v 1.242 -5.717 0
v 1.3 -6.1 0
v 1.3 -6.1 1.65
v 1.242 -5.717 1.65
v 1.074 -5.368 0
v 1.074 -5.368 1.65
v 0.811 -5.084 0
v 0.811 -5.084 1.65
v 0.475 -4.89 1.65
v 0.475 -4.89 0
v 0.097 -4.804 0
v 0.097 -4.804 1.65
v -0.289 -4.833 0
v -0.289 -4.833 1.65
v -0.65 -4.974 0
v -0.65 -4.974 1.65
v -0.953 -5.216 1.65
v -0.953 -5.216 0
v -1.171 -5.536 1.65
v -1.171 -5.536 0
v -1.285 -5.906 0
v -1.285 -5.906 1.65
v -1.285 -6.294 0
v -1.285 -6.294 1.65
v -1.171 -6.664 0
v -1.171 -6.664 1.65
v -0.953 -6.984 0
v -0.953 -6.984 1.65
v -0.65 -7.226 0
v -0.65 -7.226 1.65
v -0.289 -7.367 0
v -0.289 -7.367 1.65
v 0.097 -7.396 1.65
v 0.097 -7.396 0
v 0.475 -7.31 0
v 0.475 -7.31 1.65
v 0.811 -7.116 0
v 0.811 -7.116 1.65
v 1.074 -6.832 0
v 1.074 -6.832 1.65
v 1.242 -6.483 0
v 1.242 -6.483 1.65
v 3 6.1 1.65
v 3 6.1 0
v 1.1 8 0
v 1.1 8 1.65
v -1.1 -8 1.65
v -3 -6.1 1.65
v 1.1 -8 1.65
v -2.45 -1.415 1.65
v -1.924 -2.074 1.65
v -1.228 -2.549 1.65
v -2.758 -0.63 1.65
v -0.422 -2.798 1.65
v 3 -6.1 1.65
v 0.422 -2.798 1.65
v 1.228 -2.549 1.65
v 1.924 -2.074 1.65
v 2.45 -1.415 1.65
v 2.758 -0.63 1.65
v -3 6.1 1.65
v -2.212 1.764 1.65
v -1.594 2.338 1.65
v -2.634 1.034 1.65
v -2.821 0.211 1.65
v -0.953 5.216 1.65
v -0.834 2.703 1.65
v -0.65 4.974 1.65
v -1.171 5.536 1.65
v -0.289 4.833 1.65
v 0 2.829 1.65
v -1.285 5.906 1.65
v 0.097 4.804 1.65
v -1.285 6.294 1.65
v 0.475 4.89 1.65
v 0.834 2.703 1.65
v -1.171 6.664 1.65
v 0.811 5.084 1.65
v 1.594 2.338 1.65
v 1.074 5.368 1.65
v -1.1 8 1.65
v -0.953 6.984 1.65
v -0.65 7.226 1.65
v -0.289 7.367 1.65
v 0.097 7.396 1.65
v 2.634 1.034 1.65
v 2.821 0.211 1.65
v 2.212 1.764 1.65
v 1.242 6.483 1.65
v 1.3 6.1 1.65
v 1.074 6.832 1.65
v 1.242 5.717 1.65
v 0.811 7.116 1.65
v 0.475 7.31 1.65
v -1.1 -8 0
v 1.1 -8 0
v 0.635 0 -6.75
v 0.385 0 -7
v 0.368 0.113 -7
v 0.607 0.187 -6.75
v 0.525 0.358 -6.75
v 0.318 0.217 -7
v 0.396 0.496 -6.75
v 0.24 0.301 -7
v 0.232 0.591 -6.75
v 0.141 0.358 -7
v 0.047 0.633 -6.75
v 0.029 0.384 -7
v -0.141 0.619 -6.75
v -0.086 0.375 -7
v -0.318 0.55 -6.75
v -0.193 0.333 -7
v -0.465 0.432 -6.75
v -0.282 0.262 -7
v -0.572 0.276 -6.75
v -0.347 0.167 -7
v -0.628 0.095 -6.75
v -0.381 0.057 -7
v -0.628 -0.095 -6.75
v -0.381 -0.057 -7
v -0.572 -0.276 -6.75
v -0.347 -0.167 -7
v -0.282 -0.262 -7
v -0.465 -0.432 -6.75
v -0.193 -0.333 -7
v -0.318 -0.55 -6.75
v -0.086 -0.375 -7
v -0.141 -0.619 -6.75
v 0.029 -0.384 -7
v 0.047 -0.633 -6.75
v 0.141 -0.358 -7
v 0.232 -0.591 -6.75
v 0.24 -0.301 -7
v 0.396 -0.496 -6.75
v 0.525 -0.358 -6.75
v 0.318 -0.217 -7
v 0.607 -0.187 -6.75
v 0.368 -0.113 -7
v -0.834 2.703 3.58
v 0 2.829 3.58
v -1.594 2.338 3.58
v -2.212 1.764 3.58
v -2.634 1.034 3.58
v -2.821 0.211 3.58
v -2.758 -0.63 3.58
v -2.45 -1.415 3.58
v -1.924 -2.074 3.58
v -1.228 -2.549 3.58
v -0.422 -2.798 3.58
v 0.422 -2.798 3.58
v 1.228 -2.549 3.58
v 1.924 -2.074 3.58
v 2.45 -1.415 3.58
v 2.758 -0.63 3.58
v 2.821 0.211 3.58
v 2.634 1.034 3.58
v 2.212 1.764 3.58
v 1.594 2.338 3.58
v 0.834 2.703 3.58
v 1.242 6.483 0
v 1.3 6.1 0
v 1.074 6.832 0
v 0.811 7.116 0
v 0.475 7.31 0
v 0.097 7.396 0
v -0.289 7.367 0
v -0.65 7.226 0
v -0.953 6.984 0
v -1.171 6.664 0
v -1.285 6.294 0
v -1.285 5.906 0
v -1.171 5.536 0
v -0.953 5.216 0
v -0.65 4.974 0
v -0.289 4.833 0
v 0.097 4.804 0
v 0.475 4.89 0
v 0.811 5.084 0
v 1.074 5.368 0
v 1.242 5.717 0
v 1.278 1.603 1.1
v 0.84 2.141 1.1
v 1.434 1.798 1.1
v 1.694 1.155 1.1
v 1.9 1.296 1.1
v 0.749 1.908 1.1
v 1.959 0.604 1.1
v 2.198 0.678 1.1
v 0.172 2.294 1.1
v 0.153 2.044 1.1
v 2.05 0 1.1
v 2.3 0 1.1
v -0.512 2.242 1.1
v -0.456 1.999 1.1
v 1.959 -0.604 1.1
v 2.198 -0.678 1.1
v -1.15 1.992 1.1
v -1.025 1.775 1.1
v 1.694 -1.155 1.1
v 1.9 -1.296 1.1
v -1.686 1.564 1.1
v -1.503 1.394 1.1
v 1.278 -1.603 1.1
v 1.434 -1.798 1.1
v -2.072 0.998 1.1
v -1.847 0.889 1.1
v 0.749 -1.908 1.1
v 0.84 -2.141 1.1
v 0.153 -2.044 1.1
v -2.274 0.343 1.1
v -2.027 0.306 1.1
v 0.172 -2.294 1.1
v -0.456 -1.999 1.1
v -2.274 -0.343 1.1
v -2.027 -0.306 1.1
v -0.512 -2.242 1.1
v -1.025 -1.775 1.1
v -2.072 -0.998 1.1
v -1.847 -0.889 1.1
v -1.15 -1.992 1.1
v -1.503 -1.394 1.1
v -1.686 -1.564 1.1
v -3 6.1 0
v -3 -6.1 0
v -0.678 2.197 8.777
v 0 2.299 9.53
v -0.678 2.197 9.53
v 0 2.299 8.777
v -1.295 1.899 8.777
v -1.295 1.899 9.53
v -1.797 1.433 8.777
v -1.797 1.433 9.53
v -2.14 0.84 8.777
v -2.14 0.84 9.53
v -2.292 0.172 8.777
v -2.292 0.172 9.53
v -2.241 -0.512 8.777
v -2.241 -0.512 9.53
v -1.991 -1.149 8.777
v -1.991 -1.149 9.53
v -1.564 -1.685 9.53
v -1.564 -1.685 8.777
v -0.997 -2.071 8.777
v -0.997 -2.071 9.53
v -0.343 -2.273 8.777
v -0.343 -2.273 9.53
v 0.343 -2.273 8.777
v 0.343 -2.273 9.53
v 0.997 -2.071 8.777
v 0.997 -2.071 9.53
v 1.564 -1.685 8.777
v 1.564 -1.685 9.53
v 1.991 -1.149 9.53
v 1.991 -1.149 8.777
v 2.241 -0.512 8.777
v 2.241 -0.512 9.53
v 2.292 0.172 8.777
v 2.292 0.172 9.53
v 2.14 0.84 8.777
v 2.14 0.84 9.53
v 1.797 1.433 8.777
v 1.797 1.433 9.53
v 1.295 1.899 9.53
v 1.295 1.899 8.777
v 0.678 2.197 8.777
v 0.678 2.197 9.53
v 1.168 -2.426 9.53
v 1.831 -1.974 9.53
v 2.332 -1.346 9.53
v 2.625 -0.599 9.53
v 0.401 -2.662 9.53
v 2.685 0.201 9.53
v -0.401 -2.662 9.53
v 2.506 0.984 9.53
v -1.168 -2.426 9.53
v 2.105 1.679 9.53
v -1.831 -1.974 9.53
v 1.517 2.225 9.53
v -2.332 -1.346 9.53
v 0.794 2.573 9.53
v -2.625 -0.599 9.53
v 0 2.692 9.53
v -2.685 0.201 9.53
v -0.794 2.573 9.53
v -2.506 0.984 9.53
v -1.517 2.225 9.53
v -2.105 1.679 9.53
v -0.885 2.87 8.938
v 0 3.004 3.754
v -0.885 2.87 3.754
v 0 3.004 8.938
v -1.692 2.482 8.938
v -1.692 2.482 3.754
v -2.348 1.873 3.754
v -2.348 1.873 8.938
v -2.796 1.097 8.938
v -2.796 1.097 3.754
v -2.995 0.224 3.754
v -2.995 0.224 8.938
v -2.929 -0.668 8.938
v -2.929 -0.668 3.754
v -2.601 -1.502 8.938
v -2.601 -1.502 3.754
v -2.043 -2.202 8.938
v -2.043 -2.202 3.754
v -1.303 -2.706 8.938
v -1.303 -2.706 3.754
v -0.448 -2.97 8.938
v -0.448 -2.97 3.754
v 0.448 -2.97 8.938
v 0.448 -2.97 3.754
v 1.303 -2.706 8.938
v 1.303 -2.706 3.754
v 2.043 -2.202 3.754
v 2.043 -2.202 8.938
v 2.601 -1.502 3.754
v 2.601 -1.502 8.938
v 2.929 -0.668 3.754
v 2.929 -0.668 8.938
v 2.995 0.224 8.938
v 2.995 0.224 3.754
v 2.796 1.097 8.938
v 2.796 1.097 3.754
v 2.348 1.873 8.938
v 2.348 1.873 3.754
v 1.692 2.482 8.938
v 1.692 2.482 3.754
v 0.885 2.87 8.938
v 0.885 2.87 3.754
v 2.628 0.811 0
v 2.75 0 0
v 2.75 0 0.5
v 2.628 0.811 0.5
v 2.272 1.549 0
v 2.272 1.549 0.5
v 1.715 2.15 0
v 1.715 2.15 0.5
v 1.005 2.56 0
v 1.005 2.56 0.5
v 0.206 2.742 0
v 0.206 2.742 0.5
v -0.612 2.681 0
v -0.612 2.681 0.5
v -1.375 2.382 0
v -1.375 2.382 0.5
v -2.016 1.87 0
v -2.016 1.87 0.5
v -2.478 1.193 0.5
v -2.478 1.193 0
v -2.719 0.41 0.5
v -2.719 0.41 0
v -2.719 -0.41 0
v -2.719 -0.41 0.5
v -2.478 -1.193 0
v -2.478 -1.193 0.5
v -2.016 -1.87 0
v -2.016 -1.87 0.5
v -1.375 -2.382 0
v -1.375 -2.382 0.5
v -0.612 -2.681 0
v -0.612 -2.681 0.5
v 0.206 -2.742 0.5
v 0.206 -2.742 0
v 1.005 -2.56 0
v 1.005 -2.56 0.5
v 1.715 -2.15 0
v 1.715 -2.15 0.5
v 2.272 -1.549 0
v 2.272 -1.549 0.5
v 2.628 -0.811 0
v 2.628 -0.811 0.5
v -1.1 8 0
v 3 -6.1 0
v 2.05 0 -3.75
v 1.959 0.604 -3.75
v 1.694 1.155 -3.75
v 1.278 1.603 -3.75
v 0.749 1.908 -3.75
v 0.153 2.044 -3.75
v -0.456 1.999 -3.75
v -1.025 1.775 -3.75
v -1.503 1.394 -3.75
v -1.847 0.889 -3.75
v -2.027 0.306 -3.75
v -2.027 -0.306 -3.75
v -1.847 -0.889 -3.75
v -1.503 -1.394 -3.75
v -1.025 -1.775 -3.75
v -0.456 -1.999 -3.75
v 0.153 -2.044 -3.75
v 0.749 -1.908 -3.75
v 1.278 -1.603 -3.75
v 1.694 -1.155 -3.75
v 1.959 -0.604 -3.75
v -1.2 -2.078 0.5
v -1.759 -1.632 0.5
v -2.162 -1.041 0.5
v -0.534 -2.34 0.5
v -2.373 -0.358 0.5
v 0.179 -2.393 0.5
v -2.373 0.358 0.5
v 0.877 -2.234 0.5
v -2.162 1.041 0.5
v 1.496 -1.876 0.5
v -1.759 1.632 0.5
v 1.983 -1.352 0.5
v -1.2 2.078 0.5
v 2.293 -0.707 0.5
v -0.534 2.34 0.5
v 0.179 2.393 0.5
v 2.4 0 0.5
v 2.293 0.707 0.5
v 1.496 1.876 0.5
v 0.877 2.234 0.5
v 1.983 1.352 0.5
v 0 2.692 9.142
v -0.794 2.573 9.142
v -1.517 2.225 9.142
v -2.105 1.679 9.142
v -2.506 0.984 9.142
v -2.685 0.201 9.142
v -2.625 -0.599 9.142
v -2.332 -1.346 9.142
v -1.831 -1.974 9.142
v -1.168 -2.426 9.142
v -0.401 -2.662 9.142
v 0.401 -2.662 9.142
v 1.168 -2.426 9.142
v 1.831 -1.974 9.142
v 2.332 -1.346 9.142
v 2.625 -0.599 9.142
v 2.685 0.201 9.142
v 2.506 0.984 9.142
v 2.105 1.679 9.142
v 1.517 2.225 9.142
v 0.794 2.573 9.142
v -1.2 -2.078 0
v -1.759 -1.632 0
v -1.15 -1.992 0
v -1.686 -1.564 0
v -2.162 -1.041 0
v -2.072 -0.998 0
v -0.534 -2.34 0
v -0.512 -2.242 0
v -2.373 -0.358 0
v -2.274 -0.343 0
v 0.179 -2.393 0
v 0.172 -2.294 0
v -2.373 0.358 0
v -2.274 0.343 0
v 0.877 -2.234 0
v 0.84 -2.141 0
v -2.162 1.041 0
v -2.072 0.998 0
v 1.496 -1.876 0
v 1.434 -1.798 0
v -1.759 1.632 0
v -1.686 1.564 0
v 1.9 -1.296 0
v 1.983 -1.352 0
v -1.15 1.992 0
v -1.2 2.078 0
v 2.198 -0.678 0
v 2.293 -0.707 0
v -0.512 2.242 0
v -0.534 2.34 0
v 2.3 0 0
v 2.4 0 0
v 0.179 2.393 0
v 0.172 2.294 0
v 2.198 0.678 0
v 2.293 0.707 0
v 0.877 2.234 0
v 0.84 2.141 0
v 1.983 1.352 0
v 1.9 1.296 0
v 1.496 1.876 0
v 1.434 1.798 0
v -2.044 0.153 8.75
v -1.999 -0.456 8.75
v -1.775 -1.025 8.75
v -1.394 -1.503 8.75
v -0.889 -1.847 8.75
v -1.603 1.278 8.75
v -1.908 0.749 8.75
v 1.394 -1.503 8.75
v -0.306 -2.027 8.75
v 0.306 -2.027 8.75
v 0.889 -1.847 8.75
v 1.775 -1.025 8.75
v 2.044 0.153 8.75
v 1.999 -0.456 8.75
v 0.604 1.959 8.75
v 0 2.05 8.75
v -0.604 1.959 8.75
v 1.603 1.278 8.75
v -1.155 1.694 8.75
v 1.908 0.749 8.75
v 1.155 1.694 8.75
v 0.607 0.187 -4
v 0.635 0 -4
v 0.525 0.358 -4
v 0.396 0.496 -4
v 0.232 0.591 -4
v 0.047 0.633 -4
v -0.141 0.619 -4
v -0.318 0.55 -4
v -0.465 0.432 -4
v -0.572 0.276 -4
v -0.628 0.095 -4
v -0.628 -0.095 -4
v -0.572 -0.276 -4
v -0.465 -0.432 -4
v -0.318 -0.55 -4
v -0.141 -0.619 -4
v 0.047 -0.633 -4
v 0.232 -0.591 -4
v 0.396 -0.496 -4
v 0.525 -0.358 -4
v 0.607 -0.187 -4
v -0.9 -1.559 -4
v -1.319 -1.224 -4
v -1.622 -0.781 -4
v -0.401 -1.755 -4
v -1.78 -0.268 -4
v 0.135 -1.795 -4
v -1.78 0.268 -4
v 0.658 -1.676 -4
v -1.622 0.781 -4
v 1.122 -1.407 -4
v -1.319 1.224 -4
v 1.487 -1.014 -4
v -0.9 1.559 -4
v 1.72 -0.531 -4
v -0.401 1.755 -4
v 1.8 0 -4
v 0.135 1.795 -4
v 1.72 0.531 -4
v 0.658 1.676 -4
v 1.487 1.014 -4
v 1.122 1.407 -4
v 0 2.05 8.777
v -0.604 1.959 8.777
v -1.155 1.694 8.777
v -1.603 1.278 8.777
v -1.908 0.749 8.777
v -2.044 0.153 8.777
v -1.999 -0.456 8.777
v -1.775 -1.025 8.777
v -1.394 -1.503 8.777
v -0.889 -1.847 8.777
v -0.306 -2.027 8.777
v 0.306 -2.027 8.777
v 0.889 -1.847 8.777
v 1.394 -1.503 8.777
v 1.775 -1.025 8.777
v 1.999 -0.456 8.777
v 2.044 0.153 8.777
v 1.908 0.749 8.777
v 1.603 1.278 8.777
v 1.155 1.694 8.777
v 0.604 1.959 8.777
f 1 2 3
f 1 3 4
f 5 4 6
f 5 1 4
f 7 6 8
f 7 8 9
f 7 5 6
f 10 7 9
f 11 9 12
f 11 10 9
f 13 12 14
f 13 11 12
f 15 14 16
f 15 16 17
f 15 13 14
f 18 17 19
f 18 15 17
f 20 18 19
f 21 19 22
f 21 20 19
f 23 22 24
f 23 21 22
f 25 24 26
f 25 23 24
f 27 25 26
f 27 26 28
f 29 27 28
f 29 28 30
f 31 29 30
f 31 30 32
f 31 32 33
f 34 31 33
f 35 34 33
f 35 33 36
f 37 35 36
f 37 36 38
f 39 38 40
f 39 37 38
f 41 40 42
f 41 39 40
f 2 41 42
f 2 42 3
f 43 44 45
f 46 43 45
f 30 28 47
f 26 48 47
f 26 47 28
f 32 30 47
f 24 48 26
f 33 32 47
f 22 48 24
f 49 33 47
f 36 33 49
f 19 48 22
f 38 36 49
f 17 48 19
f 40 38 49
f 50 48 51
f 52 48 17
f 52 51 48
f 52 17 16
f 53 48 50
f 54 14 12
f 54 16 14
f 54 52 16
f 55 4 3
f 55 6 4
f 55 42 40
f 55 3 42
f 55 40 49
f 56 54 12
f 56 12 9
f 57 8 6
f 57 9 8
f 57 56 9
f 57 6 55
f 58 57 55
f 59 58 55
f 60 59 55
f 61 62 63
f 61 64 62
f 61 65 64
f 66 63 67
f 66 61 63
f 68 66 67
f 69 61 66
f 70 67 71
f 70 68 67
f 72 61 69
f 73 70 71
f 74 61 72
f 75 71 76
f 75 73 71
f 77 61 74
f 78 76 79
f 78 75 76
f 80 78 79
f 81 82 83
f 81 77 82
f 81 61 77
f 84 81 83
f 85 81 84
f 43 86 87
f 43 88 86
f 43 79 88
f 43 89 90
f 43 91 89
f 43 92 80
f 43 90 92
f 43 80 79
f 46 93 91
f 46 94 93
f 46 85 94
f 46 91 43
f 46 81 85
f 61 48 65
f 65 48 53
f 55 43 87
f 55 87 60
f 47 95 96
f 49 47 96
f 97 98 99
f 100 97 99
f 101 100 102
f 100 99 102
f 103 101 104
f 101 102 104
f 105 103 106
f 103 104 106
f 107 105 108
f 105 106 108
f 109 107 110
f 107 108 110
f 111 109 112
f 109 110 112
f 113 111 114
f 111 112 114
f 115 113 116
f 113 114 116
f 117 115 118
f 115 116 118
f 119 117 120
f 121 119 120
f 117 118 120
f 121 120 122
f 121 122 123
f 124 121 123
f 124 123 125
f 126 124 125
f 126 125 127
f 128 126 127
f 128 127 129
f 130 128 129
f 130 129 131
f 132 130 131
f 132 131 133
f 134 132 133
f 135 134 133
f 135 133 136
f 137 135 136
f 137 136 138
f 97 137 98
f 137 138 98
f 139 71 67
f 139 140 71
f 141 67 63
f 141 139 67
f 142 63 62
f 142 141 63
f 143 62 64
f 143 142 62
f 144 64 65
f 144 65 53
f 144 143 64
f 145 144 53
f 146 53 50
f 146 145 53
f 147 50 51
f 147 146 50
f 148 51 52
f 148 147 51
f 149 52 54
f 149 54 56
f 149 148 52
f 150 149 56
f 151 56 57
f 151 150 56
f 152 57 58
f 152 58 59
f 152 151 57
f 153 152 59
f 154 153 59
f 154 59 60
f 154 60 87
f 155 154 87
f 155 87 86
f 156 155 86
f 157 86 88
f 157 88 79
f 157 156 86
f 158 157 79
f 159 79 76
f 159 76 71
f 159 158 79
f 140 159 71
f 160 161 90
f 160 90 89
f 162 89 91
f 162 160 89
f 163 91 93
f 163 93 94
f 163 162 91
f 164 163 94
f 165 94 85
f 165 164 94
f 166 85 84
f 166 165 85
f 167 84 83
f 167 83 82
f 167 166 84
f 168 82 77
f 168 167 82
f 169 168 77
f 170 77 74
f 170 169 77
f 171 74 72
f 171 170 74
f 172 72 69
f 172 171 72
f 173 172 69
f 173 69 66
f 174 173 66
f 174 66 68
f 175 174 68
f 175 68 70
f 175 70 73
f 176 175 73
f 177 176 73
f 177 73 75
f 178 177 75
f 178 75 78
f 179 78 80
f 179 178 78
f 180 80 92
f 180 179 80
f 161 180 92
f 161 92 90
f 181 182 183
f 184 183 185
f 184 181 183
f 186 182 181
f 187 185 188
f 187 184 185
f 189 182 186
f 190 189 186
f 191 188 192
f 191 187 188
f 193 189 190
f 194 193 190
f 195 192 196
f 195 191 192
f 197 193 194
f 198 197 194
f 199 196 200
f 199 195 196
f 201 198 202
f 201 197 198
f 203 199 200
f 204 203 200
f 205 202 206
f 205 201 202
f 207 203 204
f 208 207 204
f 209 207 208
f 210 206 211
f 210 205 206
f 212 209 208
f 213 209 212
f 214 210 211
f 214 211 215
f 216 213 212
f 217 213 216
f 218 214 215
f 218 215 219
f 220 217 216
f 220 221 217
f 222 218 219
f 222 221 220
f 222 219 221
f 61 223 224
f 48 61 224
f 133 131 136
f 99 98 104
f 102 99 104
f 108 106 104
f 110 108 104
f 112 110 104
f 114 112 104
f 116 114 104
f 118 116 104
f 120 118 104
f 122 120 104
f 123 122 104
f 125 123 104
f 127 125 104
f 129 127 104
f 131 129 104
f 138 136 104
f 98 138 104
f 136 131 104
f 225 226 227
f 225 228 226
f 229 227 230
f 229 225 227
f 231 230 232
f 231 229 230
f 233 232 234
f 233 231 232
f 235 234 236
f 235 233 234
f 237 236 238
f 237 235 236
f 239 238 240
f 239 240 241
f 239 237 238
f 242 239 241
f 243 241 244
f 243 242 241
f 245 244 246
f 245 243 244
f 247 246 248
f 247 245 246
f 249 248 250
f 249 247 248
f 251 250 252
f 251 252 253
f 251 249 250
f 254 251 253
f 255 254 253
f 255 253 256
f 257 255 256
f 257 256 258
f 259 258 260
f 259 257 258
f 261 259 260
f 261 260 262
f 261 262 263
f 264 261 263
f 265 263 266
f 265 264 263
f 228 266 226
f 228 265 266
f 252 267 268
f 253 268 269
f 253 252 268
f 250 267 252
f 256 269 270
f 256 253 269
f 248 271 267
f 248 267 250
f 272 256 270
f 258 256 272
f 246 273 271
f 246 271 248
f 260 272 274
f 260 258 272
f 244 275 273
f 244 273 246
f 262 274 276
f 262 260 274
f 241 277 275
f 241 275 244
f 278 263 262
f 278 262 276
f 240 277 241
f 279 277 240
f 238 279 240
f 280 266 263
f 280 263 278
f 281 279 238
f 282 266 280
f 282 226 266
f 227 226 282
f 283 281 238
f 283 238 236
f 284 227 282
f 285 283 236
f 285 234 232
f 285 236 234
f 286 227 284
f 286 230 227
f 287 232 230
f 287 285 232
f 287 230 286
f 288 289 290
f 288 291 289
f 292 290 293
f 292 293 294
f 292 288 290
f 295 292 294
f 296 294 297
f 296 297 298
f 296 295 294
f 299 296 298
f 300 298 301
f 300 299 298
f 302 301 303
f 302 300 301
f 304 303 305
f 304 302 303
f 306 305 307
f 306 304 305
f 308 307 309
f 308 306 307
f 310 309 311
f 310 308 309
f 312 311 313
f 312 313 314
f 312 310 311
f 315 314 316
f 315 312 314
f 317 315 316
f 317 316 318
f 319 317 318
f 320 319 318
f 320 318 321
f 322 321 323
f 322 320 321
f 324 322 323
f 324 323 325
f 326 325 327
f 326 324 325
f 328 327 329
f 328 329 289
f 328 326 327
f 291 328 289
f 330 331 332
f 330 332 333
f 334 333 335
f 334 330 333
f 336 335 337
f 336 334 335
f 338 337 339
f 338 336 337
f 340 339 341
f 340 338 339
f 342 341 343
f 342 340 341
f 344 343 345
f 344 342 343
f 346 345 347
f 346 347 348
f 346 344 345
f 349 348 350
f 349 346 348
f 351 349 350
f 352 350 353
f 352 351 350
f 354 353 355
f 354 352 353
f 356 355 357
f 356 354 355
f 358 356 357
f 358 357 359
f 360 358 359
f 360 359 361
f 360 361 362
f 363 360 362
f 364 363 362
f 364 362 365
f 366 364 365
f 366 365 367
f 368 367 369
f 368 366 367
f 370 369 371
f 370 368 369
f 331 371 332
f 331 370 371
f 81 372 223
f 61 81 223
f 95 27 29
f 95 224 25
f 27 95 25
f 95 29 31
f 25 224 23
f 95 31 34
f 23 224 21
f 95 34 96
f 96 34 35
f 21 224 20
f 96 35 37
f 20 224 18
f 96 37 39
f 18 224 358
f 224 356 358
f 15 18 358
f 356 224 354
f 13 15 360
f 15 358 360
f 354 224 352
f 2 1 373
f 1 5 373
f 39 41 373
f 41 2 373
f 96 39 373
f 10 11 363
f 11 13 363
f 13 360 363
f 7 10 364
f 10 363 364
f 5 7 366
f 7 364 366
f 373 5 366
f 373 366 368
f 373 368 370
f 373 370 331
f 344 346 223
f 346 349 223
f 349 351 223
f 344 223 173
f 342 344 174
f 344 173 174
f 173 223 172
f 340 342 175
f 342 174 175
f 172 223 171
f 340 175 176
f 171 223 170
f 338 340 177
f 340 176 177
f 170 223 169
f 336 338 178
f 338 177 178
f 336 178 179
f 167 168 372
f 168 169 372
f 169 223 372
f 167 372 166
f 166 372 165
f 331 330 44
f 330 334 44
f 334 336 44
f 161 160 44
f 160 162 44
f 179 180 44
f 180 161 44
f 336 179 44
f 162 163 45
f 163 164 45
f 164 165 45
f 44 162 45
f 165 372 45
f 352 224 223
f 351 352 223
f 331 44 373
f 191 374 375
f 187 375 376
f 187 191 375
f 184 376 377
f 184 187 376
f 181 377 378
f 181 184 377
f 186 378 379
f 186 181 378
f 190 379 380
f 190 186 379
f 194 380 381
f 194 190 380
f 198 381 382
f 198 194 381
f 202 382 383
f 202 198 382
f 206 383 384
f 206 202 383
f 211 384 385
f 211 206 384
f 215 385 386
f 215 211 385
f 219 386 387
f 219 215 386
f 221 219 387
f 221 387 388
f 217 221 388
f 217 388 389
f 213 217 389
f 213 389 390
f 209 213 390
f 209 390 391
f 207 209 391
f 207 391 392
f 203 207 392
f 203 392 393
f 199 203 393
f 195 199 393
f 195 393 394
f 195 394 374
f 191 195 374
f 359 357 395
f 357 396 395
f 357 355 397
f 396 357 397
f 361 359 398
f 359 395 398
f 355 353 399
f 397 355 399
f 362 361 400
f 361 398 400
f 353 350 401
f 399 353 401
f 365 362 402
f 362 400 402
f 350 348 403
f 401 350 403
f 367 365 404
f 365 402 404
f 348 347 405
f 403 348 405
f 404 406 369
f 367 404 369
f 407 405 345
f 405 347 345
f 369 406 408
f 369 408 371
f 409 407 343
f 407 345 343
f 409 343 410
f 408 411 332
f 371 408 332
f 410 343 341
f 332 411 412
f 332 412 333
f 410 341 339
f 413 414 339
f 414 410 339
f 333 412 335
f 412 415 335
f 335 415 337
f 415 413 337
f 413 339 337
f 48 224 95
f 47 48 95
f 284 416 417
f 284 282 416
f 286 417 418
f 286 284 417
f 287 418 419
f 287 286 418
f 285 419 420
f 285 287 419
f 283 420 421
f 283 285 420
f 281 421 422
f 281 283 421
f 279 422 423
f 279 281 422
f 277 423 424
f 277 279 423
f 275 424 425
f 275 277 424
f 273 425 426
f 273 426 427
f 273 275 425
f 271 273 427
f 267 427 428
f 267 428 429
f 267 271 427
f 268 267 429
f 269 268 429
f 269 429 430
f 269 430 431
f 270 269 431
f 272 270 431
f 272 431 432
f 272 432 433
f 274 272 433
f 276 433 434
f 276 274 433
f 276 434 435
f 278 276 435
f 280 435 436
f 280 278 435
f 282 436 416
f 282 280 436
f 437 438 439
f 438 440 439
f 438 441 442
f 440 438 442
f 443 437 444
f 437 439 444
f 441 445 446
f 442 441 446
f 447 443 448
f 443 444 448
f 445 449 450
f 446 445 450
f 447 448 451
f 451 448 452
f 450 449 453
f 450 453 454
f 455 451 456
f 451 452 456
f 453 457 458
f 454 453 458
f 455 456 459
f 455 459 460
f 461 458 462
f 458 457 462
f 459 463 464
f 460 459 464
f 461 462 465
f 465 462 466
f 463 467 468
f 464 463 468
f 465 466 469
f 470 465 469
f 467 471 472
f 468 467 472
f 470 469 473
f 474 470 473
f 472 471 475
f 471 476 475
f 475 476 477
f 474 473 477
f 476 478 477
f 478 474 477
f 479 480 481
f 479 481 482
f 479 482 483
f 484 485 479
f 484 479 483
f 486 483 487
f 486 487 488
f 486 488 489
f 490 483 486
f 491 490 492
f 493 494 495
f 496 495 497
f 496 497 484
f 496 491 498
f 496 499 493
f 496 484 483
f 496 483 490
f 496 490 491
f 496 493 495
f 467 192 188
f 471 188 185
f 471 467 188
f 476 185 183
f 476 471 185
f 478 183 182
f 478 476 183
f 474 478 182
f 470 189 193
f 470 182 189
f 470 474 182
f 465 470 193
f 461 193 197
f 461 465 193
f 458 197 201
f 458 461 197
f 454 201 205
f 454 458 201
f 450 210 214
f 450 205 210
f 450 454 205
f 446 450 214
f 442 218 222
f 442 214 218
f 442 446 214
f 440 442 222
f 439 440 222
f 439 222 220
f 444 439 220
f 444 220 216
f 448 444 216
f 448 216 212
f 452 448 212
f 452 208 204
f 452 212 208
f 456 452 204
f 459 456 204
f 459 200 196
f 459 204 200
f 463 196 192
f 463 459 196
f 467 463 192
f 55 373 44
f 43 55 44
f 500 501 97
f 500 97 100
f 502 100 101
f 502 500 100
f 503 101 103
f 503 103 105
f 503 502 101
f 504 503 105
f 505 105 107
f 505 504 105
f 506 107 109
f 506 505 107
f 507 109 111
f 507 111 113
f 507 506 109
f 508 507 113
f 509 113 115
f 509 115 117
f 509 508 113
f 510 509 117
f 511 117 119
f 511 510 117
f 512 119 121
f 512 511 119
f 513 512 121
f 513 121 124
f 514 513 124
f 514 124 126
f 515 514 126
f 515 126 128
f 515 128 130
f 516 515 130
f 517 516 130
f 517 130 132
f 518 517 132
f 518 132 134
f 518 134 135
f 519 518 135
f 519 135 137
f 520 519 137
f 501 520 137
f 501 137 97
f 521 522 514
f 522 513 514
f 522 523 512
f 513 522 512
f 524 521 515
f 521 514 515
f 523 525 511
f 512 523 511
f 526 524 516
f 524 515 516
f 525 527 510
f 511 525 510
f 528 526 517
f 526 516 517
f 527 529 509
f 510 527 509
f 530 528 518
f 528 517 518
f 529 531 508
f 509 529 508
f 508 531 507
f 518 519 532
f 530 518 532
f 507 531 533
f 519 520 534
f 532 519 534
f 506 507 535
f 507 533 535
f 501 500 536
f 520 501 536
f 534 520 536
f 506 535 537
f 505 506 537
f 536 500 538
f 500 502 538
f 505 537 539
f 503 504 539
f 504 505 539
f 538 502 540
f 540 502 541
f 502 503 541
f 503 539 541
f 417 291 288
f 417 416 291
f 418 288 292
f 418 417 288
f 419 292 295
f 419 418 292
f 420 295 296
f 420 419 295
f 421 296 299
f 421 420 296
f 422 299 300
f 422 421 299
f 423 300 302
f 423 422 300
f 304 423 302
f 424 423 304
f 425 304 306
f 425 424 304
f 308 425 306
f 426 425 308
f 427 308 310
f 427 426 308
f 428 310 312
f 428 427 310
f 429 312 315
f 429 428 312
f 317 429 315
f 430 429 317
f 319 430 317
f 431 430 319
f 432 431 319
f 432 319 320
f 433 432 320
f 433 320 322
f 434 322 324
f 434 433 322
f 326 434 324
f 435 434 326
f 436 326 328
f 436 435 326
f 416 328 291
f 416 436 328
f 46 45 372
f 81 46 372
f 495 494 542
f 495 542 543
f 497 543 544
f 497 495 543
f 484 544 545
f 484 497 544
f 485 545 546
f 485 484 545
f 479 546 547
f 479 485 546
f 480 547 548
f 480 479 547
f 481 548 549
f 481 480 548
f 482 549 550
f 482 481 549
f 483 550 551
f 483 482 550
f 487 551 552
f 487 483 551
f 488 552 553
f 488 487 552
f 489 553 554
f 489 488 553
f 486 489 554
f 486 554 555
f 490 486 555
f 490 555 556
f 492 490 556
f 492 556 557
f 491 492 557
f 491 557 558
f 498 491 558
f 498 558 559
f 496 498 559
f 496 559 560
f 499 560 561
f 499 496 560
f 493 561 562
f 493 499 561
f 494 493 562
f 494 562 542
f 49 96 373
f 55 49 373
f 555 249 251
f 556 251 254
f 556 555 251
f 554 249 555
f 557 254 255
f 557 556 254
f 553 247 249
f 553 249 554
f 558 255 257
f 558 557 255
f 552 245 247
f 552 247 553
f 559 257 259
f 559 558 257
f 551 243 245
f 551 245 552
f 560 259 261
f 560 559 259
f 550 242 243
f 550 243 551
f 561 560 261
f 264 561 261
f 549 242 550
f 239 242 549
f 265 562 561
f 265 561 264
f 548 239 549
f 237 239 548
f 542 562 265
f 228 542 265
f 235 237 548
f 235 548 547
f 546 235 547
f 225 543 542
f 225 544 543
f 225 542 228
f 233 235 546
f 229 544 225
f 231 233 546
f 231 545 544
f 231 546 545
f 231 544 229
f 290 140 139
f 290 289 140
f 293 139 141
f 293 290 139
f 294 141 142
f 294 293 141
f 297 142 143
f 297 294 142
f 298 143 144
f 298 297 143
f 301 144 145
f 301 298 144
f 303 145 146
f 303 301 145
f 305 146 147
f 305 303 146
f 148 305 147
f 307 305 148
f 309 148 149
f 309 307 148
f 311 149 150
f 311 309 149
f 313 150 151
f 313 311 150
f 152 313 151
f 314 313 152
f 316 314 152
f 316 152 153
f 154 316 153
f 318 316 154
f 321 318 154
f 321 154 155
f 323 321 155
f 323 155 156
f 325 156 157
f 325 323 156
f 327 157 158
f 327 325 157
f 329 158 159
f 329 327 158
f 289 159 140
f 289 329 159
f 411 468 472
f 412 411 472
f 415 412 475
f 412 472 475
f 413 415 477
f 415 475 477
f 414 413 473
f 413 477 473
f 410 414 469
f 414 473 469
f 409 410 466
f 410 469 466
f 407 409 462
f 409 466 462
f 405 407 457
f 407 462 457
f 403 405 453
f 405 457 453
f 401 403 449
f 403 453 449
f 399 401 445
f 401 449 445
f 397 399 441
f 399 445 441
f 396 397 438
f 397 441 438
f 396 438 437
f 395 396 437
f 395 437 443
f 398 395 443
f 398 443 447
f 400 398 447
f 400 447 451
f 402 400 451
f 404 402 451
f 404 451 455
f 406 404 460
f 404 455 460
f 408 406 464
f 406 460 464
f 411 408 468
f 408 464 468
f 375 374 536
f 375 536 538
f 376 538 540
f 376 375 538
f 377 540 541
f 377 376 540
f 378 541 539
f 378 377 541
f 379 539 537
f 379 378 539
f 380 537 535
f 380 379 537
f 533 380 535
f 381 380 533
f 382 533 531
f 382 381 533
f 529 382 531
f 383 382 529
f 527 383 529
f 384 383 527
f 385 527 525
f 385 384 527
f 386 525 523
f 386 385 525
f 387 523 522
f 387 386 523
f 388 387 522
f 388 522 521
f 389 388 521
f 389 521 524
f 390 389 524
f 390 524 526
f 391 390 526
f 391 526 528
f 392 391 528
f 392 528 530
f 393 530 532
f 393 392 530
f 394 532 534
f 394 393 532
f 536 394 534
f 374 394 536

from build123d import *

# Parameters (mm, degrees)
SKETCH_R          = 1.3
SKETCH_R_2        = 2.3
PAD_DEPTH         = 1.65
SKETCH002_R       = 2.75
SKETCH002_R_2     = 2.4
POCKET_DEPTH      = 0.5
SKETCH003_R       = 2.05
SKETCH003_R_2     = 0.635
PAD001_DEPTH      = 8.75
PAD001_DEPTH_BACK = 4
SKETCH004_R       = 0.635
PAD002_DEPTH      = 8.75
PAD002_DEPTH_BACK = 7
CHAMFER_SIZE      = 0.25


with BuildPart() as part:
    # Sketch → Pad (new body)
    with BuildSketch(Plane.XY):
        Polygon((-3, 6.1), (-3, -6.1), (-1.1, -8), (1.1, -8), (3, -6.1), (3, 6.1), (1.1, 8), (-1.1, 8), align=None)
        with Locations((0, 6.1)):
            Circle(SKETCH_R, mode=Mode.SUBTRACT)
        with Locations((0, -6.1)):
            Circle(SKETCH_R, mode=Mode.SUBTRACT)
        Circle(SKETCH_R_2, mode=Mode.SUBTRACT)
    extrude(amount=PAD_DEPTH)

    # Sketch002 → Pocket (cut)
    with BuildSketch(Plane.XY):
        Circle(SKETCH002_R)
        Circle(SKETCH002_R_2, mode=Mode.SUBTRACT)
    extrude(amount=POCKET_DEPTH, mode=Mode.SUBTRACT)

    # Sketch001 → Revolution (revolve)
    with BuildSketch(Plane.YZ):
        Polygon((2.829161, 1.1), (2.829161, 3.579748), (3.003812, 3.754399), (3.003812, 8.938169), (2.6924, 9.14224), (2.6924, 9.53), (2.2987, 9.53), (2.2987, 8.777293), (2.05, 8.777293), (2.05, 1.1), align=None)
    revolve(axis=Axis((0, 0, 0), (0, 0, 1)))

    # Sketch003 → Pad001 (join, two sides)
    with BuildSketch(Plane.XY) as pad001_sk:
        Circle(SKETCH003_R)
        Circle(SKETCH003_R_2, mode=Mode.SUBTRACT)
    extrude(amount=PAD001_DEPTH)
    extrude(pad001_sk.sketch, amount=-PAD001_DEPTH_BACK)

    # Sketch004 → Pad002 (join, two sides)
    with BuildSketch(Plane.XY) as pad002_sk:
        Circle(SKETCH004_R)
    extrude(amount=PAD002_DEPTH)
    extrude(pad002_sk.sketch, amount=-PAD002_DEPTH_BACK)

    # Chamfer
    chamfer_edges = [part.edges().sort_by_distance(p)[0] for p in [
        (-2.05, 0, -4),
        (-0.635, 0, -7),
    ]]
    chamfer(chamfer_edges, length=CHAMFER_SIZE)


solid = part.part
